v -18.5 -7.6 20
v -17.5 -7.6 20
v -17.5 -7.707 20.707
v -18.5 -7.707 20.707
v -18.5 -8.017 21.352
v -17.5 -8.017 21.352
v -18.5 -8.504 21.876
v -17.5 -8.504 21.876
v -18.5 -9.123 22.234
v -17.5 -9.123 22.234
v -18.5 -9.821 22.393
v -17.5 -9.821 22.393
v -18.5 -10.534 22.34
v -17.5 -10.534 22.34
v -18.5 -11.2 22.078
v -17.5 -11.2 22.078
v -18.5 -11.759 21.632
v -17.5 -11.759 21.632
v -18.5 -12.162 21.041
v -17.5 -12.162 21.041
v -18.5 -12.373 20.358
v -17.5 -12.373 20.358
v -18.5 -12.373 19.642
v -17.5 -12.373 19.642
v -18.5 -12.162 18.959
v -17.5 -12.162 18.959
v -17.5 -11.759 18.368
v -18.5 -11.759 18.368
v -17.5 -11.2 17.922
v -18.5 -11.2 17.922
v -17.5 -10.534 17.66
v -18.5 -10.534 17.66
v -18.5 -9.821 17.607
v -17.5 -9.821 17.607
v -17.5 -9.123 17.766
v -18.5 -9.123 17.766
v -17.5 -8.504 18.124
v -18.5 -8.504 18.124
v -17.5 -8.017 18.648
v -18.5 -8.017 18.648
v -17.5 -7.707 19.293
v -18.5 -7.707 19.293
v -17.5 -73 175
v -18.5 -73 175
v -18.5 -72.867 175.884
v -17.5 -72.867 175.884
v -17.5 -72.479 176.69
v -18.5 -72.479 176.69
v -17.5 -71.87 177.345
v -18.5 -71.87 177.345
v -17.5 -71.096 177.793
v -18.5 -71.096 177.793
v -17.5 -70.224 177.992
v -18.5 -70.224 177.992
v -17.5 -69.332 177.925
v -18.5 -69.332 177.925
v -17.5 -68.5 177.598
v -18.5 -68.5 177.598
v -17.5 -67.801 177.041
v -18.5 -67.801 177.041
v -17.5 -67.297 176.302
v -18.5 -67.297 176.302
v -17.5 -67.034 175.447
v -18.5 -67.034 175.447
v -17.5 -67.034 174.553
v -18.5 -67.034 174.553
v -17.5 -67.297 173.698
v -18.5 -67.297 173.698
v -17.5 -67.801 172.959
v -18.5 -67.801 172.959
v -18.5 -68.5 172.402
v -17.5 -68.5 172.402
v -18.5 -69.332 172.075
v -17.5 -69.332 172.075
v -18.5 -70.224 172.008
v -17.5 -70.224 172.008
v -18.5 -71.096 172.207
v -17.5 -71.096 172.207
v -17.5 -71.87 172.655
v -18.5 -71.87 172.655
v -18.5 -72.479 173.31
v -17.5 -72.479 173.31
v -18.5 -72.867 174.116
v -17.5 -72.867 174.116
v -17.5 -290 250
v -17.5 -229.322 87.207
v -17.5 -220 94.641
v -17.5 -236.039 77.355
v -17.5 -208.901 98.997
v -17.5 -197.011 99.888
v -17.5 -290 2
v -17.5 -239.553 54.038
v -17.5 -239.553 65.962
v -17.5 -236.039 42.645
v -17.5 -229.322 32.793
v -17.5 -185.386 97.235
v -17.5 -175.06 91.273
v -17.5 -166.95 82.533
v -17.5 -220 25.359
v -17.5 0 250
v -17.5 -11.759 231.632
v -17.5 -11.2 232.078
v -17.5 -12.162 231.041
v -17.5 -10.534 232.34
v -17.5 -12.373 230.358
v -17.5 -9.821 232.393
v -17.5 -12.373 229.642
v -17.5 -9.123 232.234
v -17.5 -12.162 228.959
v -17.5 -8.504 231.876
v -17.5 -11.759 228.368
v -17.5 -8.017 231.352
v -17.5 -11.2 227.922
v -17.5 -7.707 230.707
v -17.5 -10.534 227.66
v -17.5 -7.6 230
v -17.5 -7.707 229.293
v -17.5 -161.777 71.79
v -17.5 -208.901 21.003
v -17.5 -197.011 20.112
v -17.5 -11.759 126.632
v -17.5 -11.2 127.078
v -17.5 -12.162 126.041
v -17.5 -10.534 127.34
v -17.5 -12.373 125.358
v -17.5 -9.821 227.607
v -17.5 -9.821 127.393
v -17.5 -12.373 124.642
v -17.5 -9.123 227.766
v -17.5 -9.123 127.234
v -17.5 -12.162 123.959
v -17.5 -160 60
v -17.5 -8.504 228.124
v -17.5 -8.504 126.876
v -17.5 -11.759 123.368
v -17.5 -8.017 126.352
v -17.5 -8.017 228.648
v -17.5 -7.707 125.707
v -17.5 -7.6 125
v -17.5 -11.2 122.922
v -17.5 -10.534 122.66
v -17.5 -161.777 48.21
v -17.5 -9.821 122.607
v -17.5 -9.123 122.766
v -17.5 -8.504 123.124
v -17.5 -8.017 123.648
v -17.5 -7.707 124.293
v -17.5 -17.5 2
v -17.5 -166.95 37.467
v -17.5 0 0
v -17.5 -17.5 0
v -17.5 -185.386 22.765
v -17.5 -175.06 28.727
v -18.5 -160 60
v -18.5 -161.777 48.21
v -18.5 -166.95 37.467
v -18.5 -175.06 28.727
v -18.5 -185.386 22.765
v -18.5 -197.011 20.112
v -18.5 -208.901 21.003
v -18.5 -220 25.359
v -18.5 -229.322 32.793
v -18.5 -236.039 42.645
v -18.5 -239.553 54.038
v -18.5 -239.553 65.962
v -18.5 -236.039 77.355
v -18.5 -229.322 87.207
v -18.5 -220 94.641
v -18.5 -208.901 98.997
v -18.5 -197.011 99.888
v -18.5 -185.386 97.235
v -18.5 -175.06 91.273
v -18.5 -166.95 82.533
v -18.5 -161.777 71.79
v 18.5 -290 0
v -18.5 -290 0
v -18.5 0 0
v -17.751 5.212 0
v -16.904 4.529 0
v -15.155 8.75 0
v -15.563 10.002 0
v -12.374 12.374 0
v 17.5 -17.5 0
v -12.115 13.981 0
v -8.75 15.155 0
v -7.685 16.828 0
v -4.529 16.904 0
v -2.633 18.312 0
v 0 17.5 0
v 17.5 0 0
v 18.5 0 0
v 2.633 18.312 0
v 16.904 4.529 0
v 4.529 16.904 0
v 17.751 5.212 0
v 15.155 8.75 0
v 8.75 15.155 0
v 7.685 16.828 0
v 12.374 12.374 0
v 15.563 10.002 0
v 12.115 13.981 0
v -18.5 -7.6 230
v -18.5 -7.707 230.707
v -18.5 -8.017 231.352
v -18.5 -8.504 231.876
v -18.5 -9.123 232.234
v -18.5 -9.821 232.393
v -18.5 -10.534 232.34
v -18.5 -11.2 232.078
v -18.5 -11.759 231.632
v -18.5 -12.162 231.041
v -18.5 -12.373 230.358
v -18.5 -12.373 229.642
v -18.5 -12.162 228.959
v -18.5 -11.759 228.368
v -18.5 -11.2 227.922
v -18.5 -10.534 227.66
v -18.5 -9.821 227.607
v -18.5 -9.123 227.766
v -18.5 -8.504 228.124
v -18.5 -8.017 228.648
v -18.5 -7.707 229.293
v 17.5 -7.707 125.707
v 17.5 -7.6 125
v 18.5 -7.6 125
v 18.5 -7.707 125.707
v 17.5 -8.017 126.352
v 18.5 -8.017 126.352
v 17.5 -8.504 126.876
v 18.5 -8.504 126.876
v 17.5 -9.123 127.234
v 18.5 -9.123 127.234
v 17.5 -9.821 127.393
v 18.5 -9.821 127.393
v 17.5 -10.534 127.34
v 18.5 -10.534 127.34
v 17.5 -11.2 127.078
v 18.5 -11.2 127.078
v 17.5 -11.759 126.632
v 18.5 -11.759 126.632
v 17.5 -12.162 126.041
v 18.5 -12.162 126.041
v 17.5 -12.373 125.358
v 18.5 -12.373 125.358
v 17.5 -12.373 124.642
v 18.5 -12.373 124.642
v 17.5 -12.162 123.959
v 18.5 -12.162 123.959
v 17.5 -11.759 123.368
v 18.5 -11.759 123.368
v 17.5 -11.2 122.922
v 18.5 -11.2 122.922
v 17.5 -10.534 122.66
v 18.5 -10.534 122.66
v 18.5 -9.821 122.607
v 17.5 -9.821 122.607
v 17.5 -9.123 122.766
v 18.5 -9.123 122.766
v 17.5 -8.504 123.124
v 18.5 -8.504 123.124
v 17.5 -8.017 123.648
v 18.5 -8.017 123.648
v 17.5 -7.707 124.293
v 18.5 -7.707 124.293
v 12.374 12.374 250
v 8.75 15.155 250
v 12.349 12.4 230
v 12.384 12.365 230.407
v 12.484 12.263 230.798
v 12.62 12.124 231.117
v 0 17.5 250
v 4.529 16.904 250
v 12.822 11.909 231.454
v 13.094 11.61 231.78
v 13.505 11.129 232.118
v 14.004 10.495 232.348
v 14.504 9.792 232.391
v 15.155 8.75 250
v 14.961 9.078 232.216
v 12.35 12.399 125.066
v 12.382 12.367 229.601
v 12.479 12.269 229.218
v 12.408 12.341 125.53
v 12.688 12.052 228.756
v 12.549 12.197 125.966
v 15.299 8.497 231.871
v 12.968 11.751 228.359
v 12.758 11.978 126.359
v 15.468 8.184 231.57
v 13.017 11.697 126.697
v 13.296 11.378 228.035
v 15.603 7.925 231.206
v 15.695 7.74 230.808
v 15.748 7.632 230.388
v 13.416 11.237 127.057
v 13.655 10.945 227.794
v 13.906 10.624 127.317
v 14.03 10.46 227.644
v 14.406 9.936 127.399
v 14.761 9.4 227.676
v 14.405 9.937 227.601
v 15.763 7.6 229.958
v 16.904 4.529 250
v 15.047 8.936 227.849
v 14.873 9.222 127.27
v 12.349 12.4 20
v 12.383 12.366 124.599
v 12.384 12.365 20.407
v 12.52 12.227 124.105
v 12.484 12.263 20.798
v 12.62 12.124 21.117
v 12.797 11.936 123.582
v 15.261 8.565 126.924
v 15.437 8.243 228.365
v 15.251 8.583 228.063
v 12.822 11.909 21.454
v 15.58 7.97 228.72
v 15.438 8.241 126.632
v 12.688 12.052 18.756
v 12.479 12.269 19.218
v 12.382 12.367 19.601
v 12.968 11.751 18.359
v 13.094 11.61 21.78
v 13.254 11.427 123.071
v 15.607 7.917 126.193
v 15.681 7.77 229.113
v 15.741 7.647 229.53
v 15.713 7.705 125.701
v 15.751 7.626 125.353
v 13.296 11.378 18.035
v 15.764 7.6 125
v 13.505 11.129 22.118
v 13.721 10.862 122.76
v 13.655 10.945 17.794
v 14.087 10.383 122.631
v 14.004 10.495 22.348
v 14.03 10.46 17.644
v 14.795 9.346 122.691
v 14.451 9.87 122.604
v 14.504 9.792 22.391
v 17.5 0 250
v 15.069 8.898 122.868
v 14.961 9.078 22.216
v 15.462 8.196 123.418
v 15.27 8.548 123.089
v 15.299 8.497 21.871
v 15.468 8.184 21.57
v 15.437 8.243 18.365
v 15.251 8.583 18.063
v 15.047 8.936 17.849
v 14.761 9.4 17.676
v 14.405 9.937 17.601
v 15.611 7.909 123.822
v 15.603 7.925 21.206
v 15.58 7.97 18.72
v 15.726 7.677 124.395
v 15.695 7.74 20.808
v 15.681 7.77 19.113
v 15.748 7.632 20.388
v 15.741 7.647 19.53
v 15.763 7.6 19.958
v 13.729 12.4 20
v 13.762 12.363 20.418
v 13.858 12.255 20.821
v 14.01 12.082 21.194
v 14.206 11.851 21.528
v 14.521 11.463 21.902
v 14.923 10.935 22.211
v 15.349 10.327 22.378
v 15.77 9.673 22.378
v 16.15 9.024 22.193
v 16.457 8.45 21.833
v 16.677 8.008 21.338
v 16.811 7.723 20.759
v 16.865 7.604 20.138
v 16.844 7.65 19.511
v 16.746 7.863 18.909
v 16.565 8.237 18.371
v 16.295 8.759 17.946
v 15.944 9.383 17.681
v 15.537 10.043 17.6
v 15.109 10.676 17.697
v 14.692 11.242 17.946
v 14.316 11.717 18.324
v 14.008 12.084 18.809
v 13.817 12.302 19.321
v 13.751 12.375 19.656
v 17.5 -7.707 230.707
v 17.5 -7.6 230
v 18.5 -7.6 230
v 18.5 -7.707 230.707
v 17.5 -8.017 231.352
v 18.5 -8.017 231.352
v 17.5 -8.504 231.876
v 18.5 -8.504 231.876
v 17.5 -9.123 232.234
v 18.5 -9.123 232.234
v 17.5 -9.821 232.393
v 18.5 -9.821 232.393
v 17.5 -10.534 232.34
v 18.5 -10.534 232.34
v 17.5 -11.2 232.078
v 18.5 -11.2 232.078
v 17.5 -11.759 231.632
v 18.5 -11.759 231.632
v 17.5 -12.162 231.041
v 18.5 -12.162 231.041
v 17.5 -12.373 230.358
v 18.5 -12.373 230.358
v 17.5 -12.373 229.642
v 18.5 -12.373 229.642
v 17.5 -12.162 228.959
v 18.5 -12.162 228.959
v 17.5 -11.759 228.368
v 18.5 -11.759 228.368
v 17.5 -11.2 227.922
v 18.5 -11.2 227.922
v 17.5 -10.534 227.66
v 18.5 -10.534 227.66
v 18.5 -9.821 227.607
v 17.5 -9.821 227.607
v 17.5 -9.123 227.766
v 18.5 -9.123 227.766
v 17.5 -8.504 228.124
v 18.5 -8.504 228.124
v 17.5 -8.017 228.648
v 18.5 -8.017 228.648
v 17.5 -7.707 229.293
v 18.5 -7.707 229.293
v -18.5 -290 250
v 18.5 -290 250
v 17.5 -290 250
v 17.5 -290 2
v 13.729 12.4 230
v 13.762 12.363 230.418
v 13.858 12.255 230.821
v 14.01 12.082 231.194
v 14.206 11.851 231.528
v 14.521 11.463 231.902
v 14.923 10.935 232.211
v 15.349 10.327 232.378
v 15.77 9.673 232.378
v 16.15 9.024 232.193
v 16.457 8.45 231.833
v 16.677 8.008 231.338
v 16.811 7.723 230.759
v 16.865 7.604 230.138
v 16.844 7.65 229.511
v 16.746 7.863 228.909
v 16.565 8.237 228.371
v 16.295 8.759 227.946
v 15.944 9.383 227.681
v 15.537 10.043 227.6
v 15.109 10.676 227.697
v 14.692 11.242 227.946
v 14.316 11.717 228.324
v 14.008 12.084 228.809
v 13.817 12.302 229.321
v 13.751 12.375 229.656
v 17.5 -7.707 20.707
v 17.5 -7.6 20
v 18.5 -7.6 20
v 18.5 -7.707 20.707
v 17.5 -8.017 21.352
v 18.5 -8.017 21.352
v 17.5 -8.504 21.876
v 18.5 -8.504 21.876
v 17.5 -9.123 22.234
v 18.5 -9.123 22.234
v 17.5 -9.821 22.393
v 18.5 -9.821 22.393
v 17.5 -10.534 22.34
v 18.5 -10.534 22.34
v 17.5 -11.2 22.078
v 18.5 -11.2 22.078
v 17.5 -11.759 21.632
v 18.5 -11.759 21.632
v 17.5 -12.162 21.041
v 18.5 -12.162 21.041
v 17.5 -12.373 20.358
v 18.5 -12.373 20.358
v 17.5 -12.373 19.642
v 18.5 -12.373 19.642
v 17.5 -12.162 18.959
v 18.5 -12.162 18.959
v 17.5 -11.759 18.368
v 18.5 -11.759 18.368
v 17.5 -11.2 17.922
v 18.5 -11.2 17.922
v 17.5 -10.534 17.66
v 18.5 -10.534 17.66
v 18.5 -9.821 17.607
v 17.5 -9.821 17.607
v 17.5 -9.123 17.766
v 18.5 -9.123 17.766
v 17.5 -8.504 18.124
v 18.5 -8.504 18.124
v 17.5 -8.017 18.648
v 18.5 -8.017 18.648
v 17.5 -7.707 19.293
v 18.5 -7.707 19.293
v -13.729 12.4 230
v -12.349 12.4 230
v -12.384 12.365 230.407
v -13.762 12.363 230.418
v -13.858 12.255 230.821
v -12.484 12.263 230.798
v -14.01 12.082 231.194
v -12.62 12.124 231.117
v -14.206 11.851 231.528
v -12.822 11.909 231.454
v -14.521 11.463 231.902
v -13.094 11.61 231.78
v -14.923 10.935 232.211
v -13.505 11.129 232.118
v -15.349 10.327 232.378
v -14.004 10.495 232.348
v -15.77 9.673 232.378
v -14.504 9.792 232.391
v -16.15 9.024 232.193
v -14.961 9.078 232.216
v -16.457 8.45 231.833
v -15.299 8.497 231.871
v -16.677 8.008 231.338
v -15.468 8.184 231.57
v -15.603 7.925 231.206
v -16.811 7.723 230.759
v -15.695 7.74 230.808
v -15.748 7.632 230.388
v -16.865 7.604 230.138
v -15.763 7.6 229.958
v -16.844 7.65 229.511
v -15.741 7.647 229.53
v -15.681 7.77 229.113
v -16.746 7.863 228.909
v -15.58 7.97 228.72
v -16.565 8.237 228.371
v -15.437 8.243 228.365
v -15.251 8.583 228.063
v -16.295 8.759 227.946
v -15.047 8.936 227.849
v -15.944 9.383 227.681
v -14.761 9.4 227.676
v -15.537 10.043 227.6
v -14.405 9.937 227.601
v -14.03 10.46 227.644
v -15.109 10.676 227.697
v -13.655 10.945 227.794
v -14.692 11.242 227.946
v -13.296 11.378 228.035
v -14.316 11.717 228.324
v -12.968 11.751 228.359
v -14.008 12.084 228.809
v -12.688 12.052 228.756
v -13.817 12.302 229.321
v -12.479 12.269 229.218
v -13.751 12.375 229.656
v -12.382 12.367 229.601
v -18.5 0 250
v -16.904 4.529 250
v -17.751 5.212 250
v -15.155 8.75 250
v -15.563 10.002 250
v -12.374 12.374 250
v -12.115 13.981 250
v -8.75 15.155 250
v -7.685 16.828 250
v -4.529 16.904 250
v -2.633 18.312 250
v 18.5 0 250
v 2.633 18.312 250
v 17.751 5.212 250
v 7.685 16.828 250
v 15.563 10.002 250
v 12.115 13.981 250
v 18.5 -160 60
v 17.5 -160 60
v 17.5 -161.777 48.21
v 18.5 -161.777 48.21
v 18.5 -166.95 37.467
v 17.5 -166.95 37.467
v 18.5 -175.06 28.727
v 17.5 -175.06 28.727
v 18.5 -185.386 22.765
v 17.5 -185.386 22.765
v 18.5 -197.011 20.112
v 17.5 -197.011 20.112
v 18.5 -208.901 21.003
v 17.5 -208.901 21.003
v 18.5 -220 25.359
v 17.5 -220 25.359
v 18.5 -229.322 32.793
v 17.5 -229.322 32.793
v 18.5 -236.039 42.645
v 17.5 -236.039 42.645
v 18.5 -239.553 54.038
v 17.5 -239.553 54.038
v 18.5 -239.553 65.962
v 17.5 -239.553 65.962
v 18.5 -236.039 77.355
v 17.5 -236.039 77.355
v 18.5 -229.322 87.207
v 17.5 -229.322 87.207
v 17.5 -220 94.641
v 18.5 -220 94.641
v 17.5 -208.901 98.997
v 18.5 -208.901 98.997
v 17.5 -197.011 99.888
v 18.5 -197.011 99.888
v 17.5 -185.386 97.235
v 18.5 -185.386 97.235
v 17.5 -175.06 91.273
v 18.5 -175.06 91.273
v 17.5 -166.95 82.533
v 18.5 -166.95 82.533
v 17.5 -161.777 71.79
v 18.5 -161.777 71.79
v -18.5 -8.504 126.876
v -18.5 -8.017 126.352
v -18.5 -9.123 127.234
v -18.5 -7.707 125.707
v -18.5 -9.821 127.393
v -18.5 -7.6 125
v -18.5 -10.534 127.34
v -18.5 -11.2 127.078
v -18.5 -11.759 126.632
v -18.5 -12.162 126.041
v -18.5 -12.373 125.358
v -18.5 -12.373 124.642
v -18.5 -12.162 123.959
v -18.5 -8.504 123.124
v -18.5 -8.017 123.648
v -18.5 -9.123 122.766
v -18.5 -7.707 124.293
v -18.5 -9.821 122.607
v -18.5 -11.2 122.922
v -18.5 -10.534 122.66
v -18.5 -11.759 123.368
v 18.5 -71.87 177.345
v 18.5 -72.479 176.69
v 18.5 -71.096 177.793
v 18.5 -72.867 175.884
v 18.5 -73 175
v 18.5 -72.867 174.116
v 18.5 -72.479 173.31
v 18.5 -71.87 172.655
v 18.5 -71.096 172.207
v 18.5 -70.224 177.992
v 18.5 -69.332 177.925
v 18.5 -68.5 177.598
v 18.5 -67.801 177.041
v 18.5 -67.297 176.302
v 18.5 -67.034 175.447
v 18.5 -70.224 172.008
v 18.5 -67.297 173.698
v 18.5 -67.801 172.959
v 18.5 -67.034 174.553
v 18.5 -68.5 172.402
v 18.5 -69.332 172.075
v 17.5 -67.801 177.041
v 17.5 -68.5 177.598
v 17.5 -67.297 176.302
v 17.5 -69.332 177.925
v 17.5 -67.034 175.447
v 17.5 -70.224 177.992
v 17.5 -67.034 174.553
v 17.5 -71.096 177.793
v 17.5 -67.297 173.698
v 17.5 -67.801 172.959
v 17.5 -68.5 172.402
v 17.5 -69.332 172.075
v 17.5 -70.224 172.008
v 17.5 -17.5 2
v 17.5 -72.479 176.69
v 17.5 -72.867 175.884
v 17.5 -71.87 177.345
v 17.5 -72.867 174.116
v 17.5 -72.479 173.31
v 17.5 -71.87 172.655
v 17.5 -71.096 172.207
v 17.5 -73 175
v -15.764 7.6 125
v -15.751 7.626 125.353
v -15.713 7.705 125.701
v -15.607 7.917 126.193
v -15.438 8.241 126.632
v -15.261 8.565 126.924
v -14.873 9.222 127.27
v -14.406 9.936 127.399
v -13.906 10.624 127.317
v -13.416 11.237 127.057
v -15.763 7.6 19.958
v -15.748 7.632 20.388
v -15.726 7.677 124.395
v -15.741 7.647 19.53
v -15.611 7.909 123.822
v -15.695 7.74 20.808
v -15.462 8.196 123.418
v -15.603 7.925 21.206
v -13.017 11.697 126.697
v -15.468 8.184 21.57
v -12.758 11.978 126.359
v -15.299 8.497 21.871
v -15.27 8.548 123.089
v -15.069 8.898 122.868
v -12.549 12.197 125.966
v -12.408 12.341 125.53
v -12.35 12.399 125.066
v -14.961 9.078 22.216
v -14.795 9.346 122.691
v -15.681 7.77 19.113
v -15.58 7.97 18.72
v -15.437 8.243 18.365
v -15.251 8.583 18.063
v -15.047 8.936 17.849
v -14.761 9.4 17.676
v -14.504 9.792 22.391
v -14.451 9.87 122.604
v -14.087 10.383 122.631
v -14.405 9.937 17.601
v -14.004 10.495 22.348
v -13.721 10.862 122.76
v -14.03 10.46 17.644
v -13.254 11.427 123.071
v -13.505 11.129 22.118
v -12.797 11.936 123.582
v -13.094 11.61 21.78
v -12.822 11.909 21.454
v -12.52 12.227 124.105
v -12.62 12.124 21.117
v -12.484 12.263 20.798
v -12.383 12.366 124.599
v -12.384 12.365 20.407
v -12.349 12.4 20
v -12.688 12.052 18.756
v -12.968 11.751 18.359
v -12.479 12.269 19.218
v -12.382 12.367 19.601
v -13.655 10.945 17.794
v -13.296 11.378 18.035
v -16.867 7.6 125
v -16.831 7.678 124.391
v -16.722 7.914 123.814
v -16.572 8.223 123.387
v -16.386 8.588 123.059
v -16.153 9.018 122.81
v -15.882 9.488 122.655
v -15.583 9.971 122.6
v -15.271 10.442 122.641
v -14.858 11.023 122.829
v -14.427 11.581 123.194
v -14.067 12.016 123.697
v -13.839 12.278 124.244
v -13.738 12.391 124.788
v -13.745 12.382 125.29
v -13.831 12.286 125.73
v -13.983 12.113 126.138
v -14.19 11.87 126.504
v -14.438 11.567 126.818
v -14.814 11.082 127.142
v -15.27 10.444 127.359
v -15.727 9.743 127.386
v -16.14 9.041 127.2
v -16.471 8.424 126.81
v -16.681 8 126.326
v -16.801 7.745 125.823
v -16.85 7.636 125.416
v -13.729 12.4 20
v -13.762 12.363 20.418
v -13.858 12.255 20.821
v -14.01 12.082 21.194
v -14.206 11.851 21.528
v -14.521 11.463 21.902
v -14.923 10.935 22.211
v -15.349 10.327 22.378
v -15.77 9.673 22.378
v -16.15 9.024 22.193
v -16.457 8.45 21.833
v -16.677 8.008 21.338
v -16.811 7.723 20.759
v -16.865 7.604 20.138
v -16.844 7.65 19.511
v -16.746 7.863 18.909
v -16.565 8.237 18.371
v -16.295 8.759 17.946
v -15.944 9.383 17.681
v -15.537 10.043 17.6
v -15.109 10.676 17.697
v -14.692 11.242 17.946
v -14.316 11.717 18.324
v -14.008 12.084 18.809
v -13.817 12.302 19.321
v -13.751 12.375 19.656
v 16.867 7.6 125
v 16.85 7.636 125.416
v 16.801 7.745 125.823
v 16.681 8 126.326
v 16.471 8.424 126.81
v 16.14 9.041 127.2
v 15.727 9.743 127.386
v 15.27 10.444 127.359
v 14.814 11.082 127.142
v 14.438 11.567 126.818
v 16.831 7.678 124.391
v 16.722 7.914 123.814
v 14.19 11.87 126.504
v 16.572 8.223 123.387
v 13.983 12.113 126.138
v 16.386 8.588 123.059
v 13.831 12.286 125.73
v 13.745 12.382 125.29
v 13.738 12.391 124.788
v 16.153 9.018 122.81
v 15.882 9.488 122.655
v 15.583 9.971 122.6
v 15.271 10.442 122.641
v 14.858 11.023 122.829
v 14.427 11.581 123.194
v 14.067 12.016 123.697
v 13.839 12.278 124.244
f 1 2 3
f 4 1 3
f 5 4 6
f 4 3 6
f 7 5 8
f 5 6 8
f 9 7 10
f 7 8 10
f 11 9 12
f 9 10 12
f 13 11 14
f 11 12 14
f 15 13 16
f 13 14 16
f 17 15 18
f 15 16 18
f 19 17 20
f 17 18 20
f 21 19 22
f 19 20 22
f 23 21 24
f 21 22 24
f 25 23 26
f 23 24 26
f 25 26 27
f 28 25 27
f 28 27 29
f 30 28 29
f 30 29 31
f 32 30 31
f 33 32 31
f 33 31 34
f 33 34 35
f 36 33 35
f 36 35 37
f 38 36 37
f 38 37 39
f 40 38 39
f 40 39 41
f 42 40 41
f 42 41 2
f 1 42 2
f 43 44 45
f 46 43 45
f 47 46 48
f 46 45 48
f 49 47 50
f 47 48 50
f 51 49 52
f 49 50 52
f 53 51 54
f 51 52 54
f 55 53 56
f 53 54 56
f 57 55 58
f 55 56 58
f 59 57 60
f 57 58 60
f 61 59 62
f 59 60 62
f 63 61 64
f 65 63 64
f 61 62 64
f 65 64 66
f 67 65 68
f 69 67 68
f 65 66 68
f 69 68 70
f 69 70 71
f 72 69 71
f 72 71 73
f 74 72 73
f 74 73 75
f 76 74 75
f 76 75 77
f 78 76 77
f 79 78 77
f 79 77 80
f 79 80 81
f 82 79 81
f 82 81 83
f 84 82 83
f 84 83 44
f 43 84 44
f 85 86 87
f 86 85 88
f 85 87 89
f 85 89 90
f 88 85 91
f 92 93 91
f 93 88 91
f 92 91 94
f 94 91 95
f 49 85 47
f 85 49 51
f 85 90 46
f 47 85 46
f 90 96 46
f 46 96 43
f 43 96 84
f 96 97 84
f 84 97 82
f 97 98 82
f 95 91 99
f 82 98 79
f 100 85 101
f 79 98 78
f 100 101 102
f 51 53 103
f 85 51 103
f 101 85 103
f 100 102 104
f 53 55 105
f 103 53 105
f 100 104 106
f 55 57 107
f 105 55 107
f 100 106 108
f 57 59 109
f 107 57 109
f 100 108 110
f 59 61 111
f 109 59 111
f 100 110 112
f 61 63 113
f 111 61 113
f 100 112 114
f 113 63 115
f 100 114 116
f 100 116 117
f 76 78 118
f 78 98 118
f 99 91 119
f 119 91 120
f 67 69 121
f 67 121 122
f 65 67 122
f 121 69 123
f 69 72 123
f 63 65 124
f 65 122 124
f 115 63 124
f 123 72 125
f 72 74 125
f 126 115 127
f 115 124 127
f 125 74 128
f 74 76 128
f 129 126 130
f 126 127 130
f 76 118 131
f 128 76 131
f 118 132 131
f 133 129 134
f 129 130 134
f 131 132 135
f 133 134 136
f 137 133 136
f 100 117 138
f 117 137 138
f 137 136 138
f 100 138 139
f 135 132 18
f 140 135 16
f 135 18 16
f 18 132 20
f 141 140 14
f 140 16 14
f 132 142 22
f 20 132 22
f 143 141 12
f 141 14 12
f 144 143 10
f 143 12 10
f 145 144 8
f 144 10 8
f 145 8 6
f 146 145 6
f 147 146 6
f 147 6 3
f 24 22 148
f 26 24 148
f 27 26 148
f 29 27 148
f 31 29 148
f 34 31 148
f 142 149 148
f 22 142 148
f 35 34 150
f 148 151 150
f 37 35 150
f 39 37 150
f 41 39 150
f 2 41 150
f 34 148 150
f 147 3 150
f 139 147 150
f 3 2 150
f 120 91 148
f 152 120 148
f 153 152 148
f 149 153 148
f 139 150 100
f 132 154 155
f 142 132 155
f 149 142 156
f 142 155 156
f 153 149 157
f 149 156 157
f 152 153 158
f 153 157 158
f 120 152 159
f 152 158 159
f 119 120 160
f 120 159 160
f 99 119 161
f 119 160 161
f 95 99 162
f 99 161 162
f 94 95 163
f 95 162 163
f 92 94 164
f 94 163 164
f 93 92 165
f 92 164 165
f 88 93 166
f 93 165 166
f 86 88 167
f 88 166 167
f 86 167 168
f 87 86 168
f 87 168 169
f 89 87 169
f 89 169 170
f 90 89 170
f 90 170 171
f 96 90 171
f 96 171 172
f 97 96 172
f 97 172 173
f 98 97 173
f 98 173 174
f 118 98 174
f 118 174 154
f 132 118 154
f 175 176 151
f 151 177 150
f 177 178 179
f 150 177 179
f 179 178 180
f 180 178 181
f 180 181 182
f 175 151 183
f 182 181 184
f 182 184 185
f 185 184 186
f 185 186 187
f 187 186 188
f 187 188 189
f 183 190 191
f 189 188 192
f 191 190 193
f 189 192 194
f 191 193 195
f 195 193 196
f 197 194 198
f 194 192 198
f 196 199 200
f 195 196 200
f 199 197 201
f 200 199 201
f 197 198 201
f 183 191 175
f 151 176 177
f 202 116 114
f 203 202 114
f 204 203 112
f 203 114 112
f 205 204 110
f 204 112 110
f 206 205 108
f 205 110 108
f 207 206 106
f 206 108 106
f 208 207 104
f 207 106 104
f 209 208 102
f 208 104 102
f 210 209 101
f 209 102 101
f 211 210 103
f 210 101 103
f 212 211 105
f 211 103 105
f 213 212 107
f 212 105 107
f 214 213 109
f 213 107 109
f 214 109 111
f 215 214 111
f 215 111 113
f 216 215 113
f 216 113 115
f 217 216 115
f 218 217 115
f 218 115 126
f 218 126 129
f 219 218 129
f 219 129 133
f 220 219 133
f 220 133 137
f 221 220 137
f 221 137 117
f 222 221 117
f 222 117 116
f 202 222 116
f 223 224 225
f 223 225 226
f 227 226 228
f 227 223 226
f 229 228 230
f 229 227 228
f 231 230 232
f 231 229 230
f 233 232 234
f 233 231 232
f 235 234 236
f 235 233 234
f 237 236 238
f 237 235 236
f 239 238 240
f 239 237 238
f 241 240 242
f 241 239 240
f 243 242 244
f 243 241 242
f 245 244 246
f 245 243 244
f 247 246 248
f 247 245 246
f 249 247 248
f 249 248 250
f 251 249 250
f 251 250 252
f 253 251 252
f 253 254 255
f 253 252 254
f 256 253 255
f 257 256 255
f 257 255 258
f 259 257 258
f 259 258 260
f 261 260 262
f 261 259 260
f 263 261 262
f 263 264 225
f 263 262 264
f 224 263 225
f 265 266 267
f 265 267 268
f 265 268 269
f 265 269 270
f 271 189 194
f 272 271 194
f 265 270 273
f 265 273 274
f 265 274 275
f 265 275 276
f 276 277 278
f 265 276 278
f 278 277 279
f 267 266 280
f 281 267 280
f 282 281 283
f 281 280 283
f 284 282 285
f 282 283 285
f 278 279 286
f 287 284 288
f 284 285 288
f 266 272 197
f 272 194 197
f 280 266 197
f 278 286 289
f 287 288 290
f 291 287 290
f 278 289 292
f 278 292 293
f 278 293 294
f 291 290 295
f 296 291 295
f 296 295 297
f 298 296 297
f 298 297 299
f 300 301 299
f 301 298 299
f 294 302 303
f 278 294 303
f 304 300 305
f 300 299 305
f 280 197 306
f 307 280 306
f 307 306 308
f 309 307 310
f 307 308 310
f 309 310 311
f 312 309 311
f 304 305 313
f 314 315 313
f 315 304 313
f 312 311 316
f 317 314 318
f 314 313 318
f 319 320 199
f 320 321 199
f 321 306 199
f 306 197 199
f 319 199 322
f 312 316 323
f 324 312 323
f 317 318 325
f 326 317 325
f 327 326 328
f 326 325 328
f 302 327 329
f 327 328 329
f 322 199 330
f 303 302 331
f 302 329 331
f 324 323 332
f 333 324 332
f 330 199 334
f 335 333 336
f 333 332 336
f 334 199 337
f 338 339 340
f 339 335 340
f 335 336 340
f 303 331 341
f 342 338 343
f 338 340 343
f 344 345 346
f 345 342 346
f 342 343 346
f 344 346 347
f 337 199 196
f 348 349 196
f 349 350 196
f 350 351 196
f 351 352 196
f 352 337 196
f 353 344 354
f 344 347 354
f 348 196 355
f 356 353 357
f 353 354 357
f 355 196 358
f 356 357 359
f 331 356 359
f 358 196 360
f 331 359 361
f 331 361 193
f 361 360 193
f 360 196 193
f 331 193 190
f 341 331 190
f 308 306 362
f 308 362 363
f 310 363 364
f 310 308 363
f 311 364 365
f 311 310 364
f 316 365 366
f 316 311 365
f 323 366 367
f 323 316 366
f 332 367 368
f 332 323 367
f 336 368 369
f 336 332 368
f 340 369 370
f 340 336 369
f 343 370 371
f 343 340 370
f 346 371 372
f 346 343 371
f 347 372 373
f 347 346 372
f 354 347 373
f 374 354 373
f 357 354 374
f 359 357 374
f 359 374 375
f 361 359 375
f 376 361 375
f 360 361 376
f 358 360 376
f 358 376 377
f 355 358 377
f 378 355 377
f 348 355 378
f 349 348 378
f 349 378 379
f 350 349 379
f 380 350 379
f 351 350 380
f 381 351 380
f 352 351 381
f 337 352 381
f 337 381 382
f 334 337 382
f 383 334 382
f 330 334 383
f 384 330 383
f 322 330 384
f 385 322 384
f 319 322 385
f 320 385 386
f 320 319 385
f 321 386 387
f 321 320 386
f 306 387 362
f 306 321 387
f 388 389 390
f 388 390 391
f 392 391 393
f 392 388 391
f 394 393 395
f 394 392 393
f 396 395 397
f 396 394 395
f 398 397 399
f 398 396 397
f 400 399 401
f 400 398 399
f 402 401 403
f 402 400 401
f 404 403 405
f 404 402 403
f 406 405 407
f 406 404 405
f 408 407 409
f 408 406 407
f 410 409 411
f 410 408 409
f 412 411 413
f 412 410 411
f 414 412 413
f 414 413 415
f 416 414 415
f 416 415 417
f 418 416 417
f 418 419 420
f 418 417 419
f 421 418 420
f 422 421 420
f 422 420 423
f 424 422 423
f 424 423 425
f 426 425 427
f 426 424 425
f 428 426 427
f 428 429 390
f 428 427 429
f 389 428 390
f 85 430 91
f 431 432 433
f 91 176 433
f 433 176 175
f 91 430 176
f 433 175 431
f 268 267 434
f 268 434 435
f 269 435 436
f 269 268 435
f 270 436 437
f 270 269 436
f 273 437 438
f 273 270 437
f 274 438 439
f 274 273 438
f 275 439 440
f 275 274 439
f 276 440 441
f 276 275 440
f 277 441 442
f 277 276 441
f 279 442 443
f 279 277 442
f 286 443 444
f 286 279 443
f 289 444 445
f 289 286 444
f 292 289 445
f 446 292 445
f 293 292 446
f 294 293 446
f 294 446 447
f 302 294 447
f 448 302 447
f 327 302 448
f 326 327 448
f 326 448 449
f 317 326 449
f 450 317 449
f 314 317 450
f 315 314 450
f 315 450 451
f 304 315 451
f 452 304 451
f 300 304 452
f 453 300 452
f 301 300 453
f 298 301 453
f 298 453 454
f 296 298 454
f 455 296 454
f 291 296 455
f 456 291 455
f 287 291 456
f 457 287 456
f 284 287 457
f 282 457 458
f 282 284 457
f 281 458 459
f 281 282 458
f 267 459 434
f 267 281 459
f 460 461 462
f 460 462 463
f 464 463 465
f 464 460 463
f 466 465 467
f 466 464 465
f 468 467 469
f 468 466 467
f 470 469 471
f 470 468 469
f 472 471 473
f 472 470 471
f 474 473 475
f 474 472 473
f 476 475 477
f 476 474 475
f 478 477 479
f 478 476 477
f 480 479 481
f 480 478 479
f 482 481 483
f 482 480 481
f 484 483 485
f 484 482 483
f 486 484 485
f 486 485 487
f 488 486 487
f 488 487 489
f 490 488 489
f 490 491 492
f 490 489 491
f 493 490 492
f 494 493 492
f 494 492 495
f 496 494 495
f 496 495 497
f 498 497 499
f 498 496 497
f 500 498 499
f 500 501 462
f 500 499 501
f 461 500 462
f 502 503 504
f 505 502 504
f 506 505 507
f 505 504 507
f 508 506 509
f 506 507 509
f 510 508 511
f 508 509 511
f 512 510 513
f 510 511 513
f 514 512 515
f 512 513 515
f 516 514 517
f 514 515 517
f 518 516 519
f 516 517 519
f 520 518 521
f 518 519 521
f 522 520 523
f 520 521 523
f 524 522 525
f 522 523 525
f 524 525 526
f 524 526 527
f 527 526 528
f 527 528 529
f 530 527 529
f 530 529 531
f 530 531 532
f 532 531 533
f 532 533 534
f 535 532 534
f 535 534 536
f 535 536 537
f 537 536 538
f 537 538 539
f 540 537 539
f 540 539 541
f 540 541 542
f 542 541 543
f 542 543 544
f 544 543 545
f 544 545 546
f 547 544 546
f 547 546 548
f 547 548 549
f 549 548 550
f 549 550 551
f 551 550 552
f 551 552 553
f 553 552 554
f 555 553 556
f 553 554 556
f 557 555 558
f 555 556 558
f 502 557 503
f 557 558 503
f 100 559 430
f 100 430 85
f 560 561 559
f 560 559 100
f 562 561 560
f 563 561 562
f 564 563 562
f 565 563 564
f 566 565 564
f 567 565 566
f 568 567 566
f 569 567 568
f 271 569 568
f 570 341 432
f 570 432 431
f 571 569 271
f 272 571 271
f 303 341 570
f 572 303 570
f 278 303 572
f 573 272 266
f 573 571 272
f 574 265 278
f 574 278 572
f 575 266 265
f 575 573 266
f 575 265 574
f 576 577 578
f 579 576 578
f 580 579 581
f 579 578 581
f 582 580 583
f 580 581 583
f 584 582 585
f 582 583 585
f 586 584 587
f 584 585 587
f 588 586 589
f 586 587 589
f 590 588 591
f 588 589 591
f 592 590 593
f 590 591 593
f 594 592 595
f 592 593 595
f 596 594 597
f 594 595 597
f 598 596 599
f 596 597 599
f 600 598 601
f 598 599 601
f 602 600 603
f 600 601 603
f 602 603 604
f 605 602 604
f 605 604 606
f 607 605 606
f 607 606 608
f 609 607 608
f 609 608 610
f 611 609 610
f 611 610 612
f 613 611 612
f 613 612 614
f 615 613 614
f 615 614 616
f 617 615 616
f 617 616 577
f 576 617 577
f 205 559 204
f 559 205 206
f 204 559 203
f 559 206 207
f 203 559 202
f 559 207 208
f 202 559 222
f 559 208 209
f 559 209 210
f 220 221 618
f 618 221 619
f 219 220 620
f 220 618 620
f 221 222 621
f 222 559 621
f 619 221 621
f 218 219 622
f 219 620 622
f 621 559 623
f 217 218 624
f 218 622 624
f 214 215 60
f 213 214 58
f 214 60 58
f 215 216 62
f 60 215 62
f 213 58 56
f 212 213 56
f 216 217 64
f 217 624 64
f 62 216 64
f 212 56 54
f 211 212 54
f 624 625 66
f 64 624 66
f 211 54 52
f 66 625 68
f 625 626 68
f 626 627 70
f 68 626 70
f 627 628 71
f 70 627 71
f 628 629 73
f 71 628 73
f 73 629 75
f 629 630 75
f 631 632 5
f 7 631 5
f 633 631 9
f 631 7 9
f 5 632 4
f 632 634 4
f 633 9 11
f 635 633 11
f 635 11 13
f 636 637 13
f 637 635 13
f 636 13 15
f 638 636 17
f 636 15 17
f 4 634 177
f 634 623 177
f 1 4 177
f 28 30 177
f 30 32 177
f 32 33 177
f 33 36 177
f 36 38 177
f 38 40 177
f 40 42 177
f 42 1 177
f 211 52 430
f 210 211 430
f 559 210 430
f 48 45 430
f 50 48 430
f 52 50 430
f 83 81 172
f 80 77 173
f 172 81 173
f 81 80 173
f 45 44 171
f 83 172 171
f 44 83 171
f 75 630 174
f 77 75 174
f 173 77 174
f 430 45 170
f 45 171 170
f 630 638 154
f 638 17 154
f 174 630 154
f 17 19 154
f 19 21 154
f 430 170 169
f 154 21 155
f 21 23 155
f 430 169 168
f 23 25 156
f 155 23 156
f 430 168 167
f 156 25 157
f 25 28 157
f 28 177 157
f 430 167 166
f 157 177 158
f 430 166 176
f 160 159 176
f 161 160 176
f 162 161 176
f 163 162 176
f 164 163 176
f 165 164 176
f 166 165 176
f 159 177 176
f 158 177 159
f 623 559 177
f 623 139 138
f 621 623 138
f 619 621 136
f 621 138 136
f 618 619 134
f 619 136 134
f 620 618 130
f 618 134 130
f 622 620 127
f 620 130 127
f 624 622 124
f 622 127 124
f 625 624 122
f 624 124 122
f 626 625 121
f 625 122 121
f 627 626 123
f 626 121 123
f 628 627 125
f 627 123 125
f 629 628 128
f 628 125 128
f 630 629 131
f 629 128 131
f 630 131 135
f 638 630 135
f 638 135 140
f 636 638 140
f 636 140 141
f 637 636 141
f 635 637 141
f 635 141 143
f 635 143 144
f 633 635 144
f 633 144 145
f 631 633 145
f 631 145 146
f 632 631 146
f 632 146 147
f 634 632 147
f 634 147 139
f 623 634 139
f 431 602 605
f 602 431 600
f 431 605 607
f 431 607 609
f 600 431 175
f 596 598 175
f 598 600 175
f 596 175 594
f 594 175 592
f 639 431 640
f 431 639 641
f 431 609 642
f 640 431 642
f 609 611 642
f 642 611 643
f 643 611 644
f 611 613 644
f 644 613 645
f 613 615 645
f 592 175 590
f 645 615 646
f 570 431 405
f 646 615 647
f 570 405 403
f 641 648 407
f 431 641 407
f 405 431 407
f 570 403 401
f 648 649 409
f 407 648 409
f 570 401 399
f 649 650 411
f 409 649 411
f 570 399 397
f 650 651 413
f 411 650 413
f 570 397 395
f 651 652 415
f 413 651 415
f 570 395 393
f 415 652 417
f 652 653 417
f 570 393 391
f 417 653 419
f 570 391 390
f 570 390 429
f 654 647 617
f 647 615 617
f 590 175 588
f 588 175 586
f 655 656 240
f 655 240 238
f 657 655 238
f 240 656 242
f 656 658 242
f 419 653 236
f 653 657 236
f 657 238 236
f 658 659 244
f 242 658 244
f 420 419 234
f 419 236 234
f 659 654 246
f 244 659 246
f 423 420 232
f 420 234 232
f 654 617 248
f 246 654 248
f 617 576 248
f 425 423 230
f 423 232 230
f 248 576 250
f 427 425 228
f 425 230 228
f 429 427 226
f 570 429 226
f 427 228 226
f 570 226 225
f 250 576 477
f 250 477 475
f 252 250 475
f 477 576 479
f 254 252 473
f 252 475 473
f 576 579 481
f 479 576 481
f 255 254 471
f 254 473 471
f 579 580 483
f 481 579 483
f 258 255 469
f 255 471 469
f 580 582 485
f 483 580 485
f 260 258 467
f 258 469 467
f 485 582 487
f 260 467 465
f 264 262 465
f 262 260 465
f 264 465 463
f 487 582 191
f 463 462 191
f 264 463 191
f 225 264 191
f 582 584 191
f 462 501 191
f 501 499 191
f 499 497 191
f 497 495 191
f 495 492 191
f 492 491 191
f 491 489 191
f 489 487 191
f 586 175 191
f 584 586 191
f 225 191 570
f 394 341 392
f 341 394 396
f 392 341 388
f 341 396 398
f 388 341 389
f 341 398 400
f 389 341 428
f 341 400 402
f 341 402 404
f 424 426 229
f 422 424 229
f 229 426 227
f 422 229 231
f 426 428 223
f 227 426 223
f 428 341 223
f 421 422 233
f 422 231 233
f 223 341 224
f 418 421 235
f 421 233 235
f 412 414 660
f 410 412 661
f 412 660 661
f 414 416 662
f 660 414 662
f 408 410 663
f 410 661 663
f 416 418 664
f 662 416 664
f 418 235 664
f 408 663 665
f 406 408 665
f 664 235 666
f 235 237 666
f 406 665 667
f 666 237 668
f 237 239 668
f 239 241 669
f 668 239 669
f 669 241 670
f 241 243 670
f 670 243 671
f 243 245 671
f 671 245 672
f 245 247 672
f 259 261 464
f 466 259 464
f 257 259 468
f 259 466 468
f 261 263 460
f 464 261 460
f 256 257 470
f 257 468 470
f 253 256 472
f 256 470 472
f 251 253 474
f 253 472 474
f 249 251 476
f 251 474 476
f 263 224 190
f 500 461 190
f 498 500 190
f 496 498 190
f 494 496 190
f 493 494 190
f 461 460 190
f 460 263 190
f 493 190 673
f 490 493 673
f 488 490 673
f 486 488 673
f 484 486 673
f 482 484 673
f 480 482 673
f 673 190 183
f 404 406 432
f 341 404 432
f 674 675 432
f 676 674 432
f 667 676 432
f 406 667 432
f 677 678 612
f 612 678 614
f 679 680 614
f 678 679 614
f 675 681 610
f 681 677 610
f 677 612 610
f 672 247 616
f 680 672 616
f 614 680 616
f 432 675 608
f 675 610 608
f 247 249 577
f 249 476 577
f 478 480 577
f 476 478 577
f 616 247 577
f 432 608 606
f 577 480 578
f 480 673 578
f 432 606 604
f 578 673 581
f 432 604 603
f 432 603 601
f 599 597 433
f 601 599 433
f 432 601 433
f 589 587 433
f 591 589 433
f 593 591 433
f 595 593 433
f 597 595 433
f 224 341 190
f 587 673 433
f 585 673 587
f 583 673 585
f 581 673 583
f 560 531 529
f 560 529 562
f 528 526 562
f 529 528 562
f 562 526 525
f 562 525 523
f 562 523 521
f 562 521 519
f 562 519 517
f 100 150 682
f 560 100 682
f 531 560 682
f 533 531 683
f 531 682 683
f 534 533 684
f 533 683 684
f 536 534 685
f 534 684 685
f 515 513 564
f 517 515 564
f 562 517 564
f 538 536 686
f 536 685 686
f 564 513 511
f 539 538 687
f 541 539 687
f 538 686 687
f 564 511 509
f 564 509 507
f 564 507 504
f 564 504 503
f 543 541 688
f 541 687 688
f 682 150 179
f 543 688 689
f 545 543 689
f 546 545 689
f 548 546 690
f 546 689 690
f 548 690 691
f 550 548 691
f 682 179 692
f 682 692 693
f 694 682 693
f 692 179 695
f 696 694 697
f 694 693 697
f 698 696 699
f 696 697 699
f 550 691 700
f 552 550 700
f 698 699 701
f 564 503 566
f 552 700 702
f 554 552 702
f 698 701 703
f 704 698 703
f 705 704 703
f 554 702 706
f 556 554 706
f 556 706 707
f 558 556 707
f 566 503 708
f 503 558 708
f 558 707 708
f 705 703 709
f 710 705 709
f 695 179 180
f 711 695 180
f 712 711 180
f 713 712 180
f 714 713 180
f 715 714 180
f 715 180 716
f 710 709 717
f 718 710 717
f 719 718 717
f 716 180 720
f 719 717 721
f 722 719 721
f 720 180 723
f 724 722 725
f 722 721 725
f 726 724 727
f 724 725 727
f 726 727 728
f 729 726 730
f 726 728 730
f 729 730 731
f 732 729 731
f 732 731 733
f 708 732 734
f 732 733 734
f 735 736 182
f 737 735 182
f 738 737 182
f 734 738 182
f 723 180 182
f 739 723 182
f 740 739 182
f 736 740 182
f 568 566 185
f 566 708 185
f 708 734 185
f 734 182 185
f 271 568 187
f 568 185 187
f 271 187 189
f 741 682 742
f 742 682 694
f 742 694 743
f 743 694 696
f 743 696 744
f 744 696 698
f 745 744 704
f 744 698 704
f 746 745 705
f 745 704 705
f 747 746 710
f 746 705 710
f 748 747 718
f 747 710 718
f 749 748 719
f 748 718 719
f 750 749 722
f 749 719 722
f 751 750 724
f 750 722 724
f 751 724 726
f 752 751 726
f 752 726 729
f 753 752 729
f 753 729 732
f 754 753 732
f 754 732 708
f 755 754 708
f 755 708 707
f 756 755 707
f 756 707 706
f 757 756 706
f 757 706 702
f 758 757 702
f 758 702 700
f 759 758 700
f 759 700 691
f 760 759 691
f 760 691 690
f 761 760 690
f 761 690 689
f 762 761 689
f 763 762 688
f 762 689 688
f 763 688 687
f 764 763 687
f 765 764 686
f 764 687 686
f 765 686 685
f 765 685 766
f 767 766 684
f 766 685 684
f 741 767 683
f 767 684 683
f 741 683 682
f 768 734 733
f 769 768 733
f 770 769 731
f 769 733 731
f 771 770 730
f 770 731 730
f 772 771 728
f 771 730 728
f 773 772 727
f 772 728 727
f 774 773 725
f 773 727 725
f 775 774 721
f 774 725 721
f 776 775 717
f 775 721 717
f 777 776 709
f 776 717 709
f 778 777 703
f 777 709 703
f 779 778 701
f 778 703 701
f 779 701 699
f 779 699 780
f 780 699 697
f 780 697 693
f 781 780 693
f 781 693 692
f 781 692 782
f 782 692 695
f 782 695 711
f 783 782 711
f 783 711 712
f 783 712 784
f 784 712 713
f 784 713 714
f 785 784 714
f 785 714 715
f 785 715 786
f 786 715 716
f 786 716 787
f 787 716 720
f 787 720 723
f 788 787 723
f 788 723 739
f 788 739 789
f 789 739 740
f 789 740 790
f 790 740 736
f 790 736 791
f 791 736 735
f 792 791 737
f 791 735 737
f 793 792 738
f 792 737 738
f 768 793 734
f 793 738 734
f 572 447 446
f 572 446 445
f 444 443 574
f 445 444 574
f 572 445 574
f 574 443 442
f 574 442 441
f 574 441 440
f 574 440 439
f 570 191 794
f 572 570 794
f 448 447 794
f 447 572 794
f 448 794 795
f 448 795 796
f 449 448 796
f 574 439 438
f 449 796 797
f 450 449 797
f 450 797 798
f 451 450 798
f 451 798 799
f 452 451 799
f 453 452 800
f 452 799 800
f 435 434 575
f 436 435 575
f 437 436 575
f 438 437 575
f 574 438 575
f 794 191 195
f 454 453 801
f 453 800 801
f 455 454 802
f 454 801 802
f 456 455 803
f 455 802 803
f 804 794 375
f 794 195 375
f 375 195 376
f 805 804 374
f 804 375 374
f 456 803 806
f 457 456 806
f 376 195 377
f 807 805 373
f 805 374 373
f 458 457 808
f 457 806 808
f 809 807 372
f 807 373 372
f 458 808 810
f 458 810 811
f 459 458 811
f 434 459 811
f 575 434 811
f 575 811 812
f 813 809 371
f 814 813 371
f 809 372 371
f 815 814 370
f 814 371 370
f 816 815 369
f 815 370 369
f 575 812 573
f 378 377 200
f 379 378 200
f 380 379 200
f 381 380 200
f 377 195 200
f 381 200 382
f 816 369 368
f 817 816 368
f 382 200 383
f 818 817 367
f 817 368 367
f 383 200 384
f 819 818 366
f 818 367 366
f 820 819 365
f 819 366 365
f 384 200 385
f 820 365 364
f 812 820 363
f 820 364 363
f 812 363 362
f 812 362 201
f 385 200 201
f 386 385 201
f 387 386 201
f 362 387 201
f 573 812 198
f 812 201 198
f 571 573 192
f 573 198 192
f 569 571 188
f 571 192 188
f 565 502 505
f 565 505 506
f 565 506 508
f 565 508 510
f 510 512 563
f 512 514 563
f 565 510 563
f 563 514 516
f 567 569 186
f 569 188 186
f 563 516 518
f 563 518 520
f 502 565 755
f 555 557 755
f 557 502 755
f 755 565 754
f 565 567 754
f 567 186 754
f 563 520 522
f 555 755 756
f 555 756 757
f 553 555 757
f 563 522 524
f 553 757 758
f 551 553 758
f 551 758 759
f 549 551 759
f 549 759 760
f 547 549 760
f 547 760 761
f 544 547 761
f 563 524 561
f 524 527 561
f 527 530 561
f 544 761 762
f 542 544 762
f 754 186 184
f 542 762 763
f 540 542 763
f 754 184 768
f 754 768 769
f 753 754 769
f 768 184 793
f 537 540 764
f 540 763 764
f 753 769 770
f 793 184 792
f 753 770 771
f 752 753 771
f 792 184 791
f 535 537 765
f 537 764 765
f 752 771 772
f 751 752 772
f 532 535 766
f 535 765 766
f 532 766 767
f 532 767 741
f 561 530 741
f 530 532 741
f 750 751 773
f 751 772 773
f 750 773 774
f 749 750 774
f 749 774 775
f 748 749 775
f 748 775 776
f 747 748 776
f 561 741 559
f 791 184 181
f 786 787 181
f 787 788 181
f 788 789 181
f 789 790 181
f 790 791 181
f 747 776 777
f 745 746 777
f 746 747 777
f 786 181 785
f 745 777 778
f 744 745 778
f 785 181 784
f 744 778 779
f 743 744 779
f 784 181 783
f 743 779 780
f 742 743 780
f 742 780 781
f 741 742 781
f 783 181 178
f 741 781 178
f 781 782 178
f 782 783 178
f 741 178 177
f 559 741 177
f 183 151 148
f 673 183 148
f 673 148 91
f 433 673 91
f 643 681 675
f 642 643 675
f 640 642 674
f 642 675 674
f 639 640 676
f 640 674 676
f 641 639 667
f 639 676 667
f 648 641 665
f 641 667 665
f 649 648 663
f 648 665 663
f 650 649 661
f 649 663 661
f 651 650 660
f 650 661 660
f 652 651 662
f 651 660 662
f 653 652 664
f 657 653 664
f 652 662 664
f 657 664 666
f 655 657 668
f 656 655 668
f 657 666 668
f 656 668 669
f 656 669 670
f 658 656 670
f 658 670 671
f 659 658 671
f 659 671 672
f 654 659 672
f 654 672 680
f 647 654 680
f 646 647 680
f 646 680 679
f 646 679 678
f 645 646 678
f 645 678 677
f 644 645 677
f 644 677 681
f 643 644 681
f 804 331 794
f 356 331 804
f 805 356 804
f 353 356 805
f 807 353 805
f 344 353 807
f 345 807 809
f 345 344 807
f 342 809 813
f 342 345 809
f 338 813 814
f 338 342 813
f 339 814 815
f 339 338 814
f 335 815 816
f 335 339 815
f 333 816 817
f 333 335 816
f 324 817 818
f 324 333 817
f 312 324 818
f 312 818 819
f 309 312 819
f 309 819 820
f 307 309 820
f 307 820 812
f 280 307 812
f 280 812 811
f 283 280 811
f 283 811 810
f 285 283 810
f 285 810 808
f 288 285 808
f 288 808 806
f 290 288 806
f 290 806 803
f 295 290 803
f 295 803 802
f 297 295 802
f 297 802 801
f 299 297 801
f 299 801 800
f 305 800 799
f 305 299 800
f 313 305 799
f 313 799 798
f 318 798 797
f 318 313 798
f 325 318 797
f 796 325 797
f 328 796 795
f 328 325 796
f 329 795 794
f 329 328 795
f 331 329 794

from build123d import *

# Parameters (mm, degrees)
F1_DEPTH      = 250
F2_W          = 272.5
F2_H          = 2
F3_DEPTH      = 37
F5_DEPTH      = 37.001
F6_R          = 2.4
F7_DEPTH      = 25
F7_DEPTH_BACK = 25


with BuildPart() as f1:
    # F0 (on Top) → F1 (new body)
    with BuildSketch(Plane.XY):
        with BuildLine():
            Line((18.5, -290), (18.5, 0))
            ThreePointArc((18.5, 0), (0, 18.5), (-18.5, 0))
            Line((-18.5, 0), (-18.5, -290))
            Line((-18.5, -290), (-17.5, -290))
            Line((-17.5, -290), (-17.5, 0))
            ThreePointArc((-17.5, 0), (-12.3743686708, 12.3743686708), (0, 17.5))
            ThreePointArc((0, 17.5), (12.3743686708, 12.3743686708), (17.5, 0))
            Line((17.5, 0), (17.5, -290))
            Line((17.5, -290), (18.5, -290))
        make_face()
    extrude(amount=F1_DEPTH)

    # F2 (on face) → F3 (join)
    with BuildSketch(Plane(origin=(-18.5, 0, 0), x_dir=(0, -1, 0), z_dir=(-1, 0, 0))):
        with Locations((153.75, 1)):
            Rectangle(F2_W, F2_H)
    extrude(amount=-F3_DEPTH)

    # F4 (on face) → F5 (cut, through all)
    with BuildSketch(Plane(origin=(-18.5, 0, 0), x_dir=(0, -1, 0), z_dir=(-1, 0, 0))):
        with BuildLine():
            ThreePointArc((240, 60), (200, 100), (160, 60))
            Line((160, 60), (240, 60))
        make_face()
        with BuildLine():
            Line((240, 60), (160, 60))
            ThreePointArc((160, 60), (200, 20), (240, 60))
        make_face()
        with BuildLine():
            ThreePointArc((67, 175), (70, 172), (73, 175))
            Line((73, 175), (67, 175))
        make_face()
        with BuildLine():
            Line((67, 175), (73, 175))
            ThreePointArc((73, 175), (70, 178), (67, 175))
        make_face()
    extrude(amount=-F5_DEPTH, mode=Mode.SUBTRACT)

    # F6 (on Right) → F7 (cut, two sides)
    with BuildSketch(Plane.YZ) as f7_sk:
        with Locations((-10, 20)):
            Circle(F6_R)
        with Locations((10, 20)):
            Circle(F6_R)
        with Locations((-10, 125)):
            Circle(F6_R)
        with BuildLine():
            ThreePointArc((12.4, 125), (10, 127.4), (7.6, 125))
            ThreePointArc((7.6, 125), (10, 122.6), (12.4, 125))
        make_face()
        with Locations((10, 230)):
            Circle(F6_R)
        with Locations((-10, 230)):
            Circle(F6_R)
    extrude(amount=-F7_DEPTH, mode=Mode.SUBTRACT)
    extrude(f7_sk.sketch, amount=F7_DEPTH_BACK, mode=Mode.SUBTRACT)


solid = f1.part
